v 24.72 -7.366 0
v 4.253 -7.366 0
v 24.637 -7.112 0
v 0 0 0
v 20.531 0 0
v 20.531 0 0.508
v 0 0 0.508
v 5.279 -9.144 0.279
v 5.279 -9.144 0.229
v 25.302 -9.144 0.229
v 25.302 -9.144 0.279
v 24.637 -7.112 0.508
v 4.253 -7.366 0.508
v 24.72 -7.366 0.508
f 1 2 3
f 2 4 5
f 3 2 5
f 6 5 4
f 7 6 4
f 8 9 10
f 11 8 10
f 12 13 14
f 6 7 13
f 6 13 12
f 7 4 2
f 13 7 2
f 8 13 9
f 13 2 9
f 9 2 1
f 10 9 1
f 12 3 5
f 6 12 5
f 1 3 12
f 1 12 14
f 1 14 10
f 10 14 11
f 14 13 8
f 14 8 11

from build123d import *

# Parameters (mm, degrees)
F1_DEPTH = 0.508
F3_SIZE2 = 1.778
F3_SIZE  = 0.2286
F4_DEPTH = 25.4


with BuildPart() as f1:
    # F0 (on Top) → F1 (new body)
    with BuildSketch(Plane.XY):
        Polygon((20.530576, 0), (0, 0), (5.279291, -9.144), (25.809866, -9.144), align=None)
    extrude(amount=F1_DEPTH)

    # F3
    f3_edges = [f1.edges().sort_by_distance(p)[0] for p in [
        (15.544579, -9.144, 0.508),
        (15.544579, -9.144, 0),
    ]]
    chamfer(f3_edges, length=F3_SIZE, length2=F3_SIZE2)

    # F2 (on face) → F4 (cut)
    with BuildSketch(Plane.XY.offset(0.508)):
        Polygon((25.301866, -9.144), (25.809866, -9.144), (24.636691, -7.112), align=None)
    extrude(amount=-F4_DEPTH, mode=Mode.SUBTRACT)


solid = f1.part
